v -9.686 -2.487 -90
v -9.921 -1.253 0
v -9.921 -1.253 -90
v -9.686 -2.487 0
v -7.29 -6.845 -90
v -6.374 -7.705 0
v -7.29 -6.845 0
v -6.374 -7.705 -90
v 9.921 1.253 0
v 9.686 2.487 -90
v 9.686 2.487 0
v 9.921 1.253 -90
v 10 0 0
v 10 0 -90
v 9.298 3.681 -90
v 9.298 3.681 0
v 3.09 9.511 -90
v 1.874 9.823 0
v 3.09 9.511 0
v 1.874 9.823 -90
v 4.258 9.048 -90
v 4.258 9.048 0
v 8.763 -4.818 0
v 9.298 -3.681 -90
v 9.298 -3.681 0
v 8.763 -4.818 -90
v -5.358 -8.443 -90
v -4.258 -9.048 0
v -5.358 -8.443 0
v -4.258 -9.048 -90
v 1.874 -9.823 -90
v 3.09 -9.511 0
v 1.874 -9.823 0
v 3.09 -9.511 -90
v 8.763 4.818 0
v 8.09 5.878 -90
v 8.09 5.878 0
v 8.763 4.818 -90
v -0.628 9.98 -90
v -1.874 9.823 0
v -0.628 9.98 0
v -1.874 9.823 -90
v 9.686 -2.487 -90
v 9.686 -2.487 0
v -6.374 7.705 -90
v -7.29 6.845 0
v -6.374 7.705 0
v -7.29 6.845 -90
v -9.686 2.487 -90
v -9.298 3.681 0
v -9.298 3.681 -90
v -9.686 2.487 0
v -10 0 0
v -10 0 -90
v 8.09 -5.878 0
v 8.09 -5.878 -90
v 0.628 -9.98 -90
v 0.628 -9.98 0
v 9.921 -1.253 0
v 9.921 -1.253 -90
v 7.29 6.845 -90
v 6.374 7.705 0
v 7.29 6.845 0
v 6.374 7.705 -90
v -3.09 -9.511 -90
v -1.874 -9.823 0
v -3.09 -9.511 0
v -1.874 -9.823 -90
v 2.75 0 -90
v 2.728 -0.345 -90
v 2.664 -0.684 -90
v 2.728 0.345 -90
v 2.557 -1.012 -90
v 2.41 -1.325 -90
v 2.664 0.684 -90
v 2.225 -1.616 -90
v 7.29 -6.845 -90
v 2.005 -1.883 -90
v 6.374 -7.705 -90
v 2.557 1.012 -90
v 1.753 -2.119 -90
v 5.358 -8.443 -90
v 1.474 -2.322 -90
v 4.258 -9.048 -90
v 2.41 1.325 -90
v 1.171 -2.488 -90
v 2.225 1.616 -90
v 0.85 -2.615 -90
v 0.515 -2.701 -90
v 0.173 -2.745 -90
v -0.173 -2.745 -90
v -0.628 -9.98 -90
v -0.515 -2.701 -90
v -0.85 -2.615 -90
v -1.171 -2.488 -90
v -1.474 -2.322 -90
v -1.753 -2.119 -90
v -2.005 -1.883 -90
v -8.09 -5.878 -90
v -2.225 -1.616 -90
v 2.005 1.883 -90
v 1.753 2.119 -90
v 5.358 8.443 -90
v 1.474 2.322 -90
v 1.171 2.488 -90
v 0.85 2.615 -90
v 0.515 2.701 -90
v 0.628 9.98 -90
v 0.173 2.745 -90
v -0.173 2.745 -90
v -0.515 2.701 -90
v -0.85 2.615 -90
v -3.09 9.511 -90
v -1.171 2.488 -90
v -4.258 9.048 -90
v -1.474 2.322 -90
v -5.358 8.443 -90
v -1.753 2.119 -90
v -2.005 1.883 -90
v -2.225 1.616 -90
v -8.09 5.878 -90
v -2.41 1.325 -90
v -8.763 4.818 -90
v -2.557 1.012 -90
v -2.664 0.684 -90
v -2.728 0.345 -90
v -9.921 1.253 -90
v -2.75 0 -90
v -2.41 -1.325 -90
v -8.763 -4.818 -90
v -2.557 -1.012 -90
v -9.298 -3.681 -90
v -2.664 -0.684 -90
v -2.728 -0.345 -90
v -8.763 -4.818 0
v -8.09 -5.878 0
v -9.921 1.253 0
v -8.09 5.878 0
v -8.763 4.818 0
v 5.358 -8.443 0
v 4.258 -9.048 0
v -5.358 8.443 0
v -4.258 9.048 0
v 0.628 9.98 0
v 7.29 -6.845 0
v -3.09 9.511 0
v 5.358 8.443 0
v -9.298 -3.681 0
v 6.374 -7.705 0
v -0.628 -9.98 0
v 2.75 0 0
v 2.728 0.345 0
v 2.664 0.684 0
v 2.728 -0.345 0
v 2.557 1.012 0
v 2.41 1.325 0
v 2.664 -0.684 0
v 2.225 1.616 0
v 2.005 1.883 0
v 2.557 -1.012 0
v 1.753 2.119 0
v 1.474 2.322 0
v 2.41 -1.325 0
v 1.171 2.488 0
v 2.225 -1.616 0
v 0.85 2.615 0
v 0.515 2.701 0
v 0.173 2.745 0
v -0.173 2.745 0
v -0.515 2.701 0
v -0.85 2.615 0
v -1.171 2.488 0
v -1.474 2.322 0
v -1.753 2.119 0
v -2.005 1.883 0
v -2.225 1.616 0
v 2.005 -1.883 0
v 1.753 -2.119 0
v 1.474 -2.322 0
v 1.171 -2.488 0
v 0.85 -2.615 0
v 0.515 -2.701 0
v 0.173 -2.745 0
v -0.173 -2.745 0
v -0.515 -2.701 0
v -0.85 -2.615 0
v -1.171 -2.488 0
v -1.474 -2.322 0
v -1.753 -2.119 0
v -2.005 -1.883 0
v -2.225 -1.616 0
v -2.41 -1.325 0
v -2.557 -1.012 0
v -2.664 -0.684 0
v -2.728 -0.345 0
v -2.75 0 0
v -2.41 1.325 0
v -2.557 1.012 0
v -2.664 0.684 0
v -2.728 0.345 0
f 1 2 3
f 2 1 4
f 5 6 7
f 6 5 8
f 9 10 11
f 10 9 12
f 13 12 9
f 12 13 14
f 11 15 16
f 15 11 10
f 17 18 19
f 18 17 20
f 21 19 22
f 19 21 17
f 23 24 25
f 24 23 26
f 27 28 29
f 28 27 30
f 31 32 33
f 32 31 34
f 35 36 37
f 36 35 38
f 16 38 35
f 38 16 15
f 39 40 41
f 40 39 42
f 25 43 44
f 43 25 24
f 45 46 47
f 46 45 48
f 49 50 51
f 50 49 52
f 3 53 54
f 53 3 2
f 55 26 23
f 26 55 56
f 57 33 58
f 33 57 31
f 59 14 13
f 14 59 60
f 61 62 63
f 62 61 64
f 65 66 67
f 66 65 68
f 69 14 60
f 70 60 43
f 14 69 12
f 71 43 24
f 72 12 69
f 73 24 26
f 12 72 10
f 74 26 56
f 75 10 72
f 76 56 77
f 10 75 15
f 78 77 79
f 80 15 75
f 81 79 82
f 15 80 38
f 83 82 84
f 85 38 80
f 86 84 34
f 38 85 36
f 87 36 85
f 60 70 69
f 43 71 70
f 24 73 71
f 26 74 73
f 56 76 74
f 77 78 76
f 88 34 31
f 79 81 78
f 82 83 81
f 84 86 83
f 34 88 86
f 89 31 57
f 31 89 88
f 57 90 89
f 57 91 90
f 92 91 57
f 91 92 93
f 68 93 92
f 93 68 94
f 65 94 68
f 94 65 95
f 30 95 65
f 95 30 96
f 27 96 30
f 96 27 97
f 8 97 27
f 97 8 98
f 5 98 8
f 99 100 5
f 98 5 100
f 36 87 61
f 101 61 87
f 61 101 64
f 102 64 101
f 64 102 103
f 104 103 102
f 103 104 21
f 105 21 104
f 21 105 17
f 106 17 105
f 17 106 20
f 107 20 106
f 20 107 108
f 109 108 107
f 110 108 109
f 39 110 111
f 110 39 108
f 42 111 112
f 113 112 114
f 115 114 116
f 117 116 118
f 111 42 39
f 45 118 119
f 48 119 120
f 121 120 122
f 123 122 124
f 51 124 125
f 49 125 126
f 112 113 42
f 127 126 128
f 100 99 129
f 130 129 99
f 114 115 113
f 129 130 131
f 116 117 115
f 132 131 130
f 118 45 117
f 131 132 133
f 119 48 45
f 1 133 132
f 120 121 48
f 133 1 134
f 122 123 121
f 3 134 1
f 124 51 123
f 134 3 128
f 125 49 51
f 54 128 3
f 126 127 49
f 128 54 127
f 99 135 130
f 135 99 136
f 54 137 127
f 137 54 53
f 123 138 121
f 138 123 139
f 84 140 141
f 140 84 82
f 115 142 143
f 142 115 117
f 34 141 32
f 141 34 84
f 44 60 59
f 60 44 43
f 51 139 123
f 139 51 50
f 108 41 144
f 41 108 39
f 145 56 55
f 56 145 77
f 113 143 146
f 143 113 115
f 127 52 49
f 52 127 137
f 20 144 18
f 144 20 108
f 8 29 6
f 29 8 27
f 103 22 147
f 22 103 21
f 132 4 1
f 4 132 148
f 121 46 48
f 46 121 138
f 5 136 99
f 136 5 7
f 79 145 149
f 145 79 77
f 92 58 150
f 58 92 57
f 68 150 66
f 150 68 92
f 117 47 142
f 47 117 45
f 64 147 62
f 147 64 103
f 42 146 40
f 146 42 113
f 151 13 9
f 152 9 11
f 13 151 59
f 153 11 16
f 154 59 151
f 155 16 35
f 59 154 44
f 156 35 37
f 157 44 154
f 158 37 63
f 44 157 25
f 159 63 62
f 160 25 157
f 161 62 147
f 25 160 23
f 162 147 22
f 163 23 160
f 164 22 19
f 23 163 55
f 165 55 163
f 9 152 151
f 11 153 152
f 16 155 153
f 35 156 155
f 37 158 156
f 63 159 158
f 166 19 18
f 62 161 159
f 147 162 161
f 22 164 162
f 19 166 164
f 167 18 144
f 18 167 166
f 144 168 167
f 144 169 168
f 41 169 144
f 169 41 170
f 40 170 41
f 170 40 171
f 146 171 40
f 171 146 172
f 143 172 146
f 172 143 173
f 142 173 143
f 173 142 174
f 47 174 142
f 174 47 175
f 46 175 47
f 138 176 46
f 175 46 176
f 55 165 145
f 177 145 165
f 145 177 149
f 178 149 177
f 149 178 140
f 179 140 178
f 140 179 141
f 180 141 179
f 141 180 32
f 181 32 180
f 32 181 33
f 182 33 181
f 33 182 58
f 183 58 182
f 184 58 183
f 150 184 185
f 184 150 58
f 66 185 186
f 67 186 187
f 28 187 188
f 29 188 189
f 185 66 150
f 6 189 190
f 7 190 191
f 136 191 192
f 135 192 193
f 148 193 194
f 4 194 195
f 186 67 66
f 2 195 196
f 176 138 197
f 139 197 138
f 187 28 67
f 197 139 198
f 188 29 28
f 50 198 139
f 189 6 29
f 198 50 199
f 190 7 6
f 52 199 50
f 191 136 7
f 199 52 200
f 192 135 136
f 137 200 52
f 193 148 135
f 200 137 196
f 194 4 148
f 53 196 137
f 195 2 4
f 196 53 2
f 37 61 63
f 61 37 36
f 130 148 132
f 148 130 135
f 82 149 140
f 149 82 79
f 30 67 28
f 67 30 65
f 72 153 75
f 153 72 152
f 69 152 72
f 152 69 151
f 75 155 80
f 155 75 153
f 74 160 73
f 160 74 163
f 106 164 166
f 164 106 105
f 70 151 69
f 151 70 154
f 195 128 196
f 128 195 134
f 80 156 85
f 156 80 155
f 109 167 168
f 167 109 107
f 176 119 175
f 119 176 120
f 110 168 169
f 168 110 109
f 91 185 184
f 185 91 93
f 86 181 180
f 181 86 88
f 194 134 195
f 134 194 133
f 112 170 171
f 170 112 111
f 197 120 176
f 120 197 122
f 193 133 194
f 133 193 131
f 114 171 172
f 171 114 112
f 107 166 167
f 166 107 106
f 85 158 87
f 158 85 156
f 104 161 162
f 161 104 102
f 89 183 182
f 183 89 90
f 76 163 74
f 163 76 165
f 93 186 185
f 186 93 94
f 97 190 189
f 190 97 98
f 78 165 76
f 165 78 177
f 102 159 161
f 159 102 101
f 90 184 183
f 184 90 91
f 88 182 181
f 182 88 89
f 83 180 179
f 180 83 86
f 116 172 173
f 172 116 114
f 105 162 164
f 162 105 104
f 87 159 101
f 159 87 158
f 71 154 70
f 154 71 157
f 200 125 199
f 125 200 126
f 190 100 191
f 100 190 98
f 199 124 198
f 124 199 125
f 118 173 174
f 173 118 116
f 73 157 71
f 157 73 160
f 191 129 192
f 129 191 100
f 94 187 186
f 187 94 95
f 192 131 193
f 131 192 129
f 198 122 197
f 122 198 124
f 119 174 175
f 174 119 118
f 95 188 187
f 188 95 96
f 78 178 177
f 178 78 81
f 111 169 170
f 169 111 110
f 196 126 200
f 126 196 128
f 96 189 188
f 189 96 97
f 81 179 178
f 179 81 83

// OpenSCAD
$fn = 50;


difference() {
	union() {
		translate(v = [0, 0, -90.0000000000]) {
			cylinder(h = 90, r = 10.0000000000);
		}
		cylinder(h = 0, r = 13.0000000000);
	}
	union() {
		#translate(v = [0, 0, -90]) {
			cylinder(h = 90, r = 2.7500000000);
		}
	}
}
